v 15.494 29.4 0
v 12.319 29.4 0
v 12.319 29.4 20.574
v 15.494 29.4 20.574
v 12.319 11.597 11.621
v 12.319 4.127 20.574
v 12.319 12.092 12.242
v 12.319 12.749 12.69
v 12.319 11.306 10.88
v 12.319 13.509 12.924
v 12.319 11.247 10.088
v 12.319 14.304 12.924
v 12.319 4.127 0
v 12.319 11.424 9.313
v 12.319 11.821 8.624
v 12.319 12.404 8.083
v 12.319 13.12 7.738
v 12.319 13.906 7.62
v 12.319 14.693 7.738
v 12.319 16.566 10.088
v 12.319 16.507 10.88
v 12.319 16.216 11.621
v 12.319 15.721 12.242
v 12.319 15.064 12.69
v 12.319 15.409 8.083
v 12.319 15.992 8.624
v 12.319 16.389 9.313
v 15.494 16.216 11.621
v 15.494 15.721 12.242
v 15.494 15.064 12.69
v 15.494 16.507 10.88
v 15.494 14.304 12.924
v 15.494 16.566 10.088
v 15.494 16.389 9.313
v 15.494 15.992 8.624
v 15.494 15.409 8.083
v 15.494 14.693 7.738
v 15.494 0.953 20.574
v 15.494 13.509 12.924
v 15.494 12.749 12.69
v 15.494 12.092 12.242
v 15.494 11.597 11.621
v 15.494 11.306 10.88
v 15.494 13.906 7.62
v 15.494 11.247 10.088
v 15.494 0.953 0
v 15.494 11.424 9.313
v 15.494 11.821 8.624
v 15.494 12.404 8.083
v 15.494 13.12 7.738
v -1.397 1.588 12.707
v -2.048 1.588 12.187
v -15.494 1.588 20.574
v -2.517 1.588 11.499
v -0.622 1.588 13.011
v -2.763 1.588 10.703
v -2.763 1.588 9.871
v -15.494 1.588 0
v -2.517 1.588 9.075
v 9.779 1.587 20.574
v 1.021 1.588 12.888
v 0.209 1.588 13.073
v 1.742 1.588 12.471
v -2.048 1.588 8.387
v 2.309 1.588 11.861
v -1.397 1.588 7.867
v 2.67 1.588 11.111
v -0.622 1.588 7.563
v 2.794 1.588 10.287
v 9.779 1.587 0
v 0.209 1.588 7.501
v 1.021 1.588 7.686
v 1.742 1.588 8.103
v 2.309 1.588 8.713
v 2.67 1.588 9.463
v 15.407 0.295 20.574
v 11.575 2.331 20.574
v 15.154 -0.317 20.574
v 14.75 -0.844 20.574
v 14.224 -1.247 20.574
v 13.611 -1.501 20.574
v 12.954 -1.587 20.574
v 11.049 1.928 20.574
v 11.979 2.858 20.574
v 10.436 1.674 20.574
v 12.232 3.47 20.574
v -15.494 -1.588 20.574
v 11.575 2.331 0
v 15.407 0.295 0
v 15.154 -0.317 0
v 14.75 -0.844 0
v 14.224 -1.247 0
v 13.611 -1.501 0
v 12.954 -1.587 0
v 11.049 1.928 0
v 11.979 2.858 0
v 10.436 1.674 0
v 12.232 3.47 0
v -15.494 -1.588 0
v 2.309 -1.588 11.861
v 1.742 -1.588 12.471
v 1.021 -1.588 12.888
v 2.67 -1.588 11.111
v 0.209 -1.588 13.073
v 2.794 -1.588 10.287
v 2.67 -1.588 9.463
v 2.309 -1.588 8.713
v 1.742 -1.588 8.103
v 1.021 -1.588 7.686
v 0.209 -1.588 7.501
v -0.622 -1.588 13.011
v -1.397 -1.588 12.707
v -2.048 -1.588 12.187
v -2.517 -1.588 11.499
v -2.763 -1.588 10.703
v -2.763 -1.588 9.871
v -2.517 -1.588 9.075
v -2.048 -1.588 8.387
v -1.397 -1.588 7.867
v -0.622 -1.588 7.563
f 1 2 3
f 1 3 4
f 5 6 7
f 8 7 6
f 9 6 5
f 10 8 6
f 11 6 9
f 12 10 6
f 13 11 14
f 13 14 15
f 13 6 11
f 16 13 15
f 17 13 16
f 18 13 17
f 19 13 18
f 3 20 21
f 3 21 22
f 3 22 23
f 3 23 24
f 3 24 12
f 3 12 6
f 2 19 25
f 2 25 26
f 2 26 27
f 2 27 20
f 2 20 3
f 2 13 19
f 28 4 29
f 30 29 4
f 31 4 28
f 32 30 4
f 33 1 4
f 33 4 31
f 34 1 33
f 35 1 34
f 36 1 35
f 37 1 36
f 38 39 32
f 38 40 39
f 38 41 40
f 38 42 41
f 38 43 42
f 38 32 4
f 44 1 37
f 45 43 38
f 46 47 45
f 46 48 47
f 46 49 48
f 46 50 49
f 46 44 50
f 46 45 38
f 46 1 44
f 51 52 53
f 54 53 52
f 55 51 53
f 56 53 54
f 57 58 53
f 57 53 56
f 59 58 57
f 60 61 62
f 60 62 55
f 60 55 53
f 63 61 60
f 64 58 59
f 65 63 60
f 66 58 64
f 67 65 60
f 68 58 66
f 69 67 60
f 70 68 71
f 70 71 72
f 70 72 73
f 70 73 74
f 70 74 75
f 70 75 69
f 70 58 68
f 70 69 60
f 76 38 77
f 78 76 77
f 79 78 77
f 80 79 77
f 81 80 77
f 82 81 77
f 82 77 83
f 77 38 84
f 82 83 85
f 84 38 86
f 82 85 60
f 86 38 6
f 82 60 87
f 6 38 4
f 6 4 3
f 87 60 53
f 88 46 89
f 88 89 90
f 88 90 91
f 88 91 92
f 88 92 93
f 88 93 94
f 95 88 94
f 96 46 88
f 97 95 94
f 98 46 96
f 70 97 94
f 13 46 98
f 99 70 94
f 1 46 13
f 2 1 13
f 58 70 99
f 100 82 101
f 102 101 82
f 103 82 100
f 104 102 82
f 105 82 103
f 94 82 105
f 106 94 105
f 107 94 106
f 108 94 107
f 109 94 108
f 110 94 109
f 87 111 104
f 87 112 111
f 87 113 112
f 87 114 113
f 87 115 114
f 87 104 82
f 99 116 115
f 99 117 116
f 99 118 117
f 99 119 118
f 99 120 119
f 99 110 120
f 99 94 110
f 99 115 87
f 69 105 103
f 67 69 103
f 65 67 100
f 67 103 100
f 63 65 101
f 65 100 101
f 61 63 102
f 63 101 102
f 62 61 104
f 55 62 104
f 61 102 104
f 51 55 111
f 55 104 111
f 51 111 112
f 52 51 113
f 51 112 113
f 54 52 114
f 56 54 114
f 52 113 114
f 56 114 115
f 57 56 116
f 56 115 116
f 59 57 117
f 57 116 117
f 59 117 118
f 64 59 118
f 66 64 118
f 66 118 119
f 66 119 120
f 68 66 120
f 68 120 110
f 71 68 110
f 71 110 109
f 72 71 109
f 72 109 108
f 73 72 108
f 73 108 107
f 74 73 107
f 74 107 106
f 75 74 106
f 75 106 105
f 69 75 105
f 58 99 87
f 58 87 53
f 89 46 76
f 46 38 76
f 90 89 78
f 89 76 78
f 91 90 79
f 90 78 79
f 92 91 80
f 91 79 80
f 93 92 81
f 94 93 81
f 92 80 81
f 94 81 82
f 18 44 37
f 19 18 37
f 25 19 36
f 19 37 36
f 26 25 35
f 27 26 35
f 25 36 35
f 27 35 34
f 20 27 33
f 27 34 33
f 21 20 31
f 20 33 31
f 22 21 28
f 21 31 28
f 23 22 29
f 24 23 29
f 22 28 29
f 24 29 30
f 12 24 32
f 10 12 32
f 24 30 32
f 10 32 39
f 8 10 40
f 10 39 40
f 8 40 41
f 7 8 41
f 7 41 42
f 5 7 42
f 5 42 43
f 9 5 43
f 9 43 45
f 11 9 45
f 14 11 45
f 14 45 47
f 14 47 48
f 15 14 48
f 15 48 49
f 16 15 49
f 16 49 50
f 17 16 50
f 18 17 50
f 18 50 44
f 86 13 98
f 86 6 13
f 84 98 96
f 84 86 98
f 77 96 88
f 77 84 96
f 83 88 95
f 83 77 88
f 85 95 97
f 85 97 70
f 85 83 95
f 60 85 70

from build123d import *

# Parameters (mm, degrees)
BOSS_EXTRUDE1_DEPTH = 20.574
FILLET1_R           = 2.54
FILLET2_R           = 2.54
SKETCH2_R           = 2.667
CUT_EXTRUDE1_DEPTH  = 31.988
SKETCH3_R           = 2.794
CUT_EXTRUDE2_DEPTH  = 31.988


with BuildPart() as part:
    # Sketch1 → Boss-Extrude1 (new body)
    with BuildSketch(Plane.XY):
        Polygon((12.319, 1.5875), (12.319, 29.4005), (15.494, 29.4005), (15.494, -1.5875), (-15.494, -1.5875), (-15.494, 1.5875), align=None)
    extrude(amount=BOSS_EXTRUDE1_DEPTH)

    # Fillet1
    fillet1_edges = [part.edges().sort_by_distance(p)[0] for p in [
        (12.319, 1.5875, 10.287),
    ]]
    fillet(fillet1_edges, radius=FILLET1_R)

    # Fillet2
    fillet2_edges = [part.edges().sort_by_distance(p)[0] for p in [
        (15.494, -1.5875, 10.287),
    ]]
    fillet(fillet2_edges, radius=FILLET2_R)

    # Sketch2 → Cut-Extrude1 (cut, through all)
    with BuildSketch(Plane(origin=(15.494, 0, 0), x_dir=(0, 0, -1), z_dir=(1, 0, 0))):
        with Locations((-10.287, 13.9065)):
            Circle(SKETCH2_R)
    extrude(amount=-CUT_EXTRUDE1_DEPTH, mode=Mode.SUBTRACT)

    # Sketch3 → Cut-Extrude2 (cut, through all)
    with BuildSketch(Plane.XZ.offset(1.5875)):
        with Locations((0, 10.287)):
            Circle(SKETCH3_R)
    extrude(amount=-CUT_EXTRUDE2_DEPTH, mode=Mode.SUBTRACT)


solid = part.part
